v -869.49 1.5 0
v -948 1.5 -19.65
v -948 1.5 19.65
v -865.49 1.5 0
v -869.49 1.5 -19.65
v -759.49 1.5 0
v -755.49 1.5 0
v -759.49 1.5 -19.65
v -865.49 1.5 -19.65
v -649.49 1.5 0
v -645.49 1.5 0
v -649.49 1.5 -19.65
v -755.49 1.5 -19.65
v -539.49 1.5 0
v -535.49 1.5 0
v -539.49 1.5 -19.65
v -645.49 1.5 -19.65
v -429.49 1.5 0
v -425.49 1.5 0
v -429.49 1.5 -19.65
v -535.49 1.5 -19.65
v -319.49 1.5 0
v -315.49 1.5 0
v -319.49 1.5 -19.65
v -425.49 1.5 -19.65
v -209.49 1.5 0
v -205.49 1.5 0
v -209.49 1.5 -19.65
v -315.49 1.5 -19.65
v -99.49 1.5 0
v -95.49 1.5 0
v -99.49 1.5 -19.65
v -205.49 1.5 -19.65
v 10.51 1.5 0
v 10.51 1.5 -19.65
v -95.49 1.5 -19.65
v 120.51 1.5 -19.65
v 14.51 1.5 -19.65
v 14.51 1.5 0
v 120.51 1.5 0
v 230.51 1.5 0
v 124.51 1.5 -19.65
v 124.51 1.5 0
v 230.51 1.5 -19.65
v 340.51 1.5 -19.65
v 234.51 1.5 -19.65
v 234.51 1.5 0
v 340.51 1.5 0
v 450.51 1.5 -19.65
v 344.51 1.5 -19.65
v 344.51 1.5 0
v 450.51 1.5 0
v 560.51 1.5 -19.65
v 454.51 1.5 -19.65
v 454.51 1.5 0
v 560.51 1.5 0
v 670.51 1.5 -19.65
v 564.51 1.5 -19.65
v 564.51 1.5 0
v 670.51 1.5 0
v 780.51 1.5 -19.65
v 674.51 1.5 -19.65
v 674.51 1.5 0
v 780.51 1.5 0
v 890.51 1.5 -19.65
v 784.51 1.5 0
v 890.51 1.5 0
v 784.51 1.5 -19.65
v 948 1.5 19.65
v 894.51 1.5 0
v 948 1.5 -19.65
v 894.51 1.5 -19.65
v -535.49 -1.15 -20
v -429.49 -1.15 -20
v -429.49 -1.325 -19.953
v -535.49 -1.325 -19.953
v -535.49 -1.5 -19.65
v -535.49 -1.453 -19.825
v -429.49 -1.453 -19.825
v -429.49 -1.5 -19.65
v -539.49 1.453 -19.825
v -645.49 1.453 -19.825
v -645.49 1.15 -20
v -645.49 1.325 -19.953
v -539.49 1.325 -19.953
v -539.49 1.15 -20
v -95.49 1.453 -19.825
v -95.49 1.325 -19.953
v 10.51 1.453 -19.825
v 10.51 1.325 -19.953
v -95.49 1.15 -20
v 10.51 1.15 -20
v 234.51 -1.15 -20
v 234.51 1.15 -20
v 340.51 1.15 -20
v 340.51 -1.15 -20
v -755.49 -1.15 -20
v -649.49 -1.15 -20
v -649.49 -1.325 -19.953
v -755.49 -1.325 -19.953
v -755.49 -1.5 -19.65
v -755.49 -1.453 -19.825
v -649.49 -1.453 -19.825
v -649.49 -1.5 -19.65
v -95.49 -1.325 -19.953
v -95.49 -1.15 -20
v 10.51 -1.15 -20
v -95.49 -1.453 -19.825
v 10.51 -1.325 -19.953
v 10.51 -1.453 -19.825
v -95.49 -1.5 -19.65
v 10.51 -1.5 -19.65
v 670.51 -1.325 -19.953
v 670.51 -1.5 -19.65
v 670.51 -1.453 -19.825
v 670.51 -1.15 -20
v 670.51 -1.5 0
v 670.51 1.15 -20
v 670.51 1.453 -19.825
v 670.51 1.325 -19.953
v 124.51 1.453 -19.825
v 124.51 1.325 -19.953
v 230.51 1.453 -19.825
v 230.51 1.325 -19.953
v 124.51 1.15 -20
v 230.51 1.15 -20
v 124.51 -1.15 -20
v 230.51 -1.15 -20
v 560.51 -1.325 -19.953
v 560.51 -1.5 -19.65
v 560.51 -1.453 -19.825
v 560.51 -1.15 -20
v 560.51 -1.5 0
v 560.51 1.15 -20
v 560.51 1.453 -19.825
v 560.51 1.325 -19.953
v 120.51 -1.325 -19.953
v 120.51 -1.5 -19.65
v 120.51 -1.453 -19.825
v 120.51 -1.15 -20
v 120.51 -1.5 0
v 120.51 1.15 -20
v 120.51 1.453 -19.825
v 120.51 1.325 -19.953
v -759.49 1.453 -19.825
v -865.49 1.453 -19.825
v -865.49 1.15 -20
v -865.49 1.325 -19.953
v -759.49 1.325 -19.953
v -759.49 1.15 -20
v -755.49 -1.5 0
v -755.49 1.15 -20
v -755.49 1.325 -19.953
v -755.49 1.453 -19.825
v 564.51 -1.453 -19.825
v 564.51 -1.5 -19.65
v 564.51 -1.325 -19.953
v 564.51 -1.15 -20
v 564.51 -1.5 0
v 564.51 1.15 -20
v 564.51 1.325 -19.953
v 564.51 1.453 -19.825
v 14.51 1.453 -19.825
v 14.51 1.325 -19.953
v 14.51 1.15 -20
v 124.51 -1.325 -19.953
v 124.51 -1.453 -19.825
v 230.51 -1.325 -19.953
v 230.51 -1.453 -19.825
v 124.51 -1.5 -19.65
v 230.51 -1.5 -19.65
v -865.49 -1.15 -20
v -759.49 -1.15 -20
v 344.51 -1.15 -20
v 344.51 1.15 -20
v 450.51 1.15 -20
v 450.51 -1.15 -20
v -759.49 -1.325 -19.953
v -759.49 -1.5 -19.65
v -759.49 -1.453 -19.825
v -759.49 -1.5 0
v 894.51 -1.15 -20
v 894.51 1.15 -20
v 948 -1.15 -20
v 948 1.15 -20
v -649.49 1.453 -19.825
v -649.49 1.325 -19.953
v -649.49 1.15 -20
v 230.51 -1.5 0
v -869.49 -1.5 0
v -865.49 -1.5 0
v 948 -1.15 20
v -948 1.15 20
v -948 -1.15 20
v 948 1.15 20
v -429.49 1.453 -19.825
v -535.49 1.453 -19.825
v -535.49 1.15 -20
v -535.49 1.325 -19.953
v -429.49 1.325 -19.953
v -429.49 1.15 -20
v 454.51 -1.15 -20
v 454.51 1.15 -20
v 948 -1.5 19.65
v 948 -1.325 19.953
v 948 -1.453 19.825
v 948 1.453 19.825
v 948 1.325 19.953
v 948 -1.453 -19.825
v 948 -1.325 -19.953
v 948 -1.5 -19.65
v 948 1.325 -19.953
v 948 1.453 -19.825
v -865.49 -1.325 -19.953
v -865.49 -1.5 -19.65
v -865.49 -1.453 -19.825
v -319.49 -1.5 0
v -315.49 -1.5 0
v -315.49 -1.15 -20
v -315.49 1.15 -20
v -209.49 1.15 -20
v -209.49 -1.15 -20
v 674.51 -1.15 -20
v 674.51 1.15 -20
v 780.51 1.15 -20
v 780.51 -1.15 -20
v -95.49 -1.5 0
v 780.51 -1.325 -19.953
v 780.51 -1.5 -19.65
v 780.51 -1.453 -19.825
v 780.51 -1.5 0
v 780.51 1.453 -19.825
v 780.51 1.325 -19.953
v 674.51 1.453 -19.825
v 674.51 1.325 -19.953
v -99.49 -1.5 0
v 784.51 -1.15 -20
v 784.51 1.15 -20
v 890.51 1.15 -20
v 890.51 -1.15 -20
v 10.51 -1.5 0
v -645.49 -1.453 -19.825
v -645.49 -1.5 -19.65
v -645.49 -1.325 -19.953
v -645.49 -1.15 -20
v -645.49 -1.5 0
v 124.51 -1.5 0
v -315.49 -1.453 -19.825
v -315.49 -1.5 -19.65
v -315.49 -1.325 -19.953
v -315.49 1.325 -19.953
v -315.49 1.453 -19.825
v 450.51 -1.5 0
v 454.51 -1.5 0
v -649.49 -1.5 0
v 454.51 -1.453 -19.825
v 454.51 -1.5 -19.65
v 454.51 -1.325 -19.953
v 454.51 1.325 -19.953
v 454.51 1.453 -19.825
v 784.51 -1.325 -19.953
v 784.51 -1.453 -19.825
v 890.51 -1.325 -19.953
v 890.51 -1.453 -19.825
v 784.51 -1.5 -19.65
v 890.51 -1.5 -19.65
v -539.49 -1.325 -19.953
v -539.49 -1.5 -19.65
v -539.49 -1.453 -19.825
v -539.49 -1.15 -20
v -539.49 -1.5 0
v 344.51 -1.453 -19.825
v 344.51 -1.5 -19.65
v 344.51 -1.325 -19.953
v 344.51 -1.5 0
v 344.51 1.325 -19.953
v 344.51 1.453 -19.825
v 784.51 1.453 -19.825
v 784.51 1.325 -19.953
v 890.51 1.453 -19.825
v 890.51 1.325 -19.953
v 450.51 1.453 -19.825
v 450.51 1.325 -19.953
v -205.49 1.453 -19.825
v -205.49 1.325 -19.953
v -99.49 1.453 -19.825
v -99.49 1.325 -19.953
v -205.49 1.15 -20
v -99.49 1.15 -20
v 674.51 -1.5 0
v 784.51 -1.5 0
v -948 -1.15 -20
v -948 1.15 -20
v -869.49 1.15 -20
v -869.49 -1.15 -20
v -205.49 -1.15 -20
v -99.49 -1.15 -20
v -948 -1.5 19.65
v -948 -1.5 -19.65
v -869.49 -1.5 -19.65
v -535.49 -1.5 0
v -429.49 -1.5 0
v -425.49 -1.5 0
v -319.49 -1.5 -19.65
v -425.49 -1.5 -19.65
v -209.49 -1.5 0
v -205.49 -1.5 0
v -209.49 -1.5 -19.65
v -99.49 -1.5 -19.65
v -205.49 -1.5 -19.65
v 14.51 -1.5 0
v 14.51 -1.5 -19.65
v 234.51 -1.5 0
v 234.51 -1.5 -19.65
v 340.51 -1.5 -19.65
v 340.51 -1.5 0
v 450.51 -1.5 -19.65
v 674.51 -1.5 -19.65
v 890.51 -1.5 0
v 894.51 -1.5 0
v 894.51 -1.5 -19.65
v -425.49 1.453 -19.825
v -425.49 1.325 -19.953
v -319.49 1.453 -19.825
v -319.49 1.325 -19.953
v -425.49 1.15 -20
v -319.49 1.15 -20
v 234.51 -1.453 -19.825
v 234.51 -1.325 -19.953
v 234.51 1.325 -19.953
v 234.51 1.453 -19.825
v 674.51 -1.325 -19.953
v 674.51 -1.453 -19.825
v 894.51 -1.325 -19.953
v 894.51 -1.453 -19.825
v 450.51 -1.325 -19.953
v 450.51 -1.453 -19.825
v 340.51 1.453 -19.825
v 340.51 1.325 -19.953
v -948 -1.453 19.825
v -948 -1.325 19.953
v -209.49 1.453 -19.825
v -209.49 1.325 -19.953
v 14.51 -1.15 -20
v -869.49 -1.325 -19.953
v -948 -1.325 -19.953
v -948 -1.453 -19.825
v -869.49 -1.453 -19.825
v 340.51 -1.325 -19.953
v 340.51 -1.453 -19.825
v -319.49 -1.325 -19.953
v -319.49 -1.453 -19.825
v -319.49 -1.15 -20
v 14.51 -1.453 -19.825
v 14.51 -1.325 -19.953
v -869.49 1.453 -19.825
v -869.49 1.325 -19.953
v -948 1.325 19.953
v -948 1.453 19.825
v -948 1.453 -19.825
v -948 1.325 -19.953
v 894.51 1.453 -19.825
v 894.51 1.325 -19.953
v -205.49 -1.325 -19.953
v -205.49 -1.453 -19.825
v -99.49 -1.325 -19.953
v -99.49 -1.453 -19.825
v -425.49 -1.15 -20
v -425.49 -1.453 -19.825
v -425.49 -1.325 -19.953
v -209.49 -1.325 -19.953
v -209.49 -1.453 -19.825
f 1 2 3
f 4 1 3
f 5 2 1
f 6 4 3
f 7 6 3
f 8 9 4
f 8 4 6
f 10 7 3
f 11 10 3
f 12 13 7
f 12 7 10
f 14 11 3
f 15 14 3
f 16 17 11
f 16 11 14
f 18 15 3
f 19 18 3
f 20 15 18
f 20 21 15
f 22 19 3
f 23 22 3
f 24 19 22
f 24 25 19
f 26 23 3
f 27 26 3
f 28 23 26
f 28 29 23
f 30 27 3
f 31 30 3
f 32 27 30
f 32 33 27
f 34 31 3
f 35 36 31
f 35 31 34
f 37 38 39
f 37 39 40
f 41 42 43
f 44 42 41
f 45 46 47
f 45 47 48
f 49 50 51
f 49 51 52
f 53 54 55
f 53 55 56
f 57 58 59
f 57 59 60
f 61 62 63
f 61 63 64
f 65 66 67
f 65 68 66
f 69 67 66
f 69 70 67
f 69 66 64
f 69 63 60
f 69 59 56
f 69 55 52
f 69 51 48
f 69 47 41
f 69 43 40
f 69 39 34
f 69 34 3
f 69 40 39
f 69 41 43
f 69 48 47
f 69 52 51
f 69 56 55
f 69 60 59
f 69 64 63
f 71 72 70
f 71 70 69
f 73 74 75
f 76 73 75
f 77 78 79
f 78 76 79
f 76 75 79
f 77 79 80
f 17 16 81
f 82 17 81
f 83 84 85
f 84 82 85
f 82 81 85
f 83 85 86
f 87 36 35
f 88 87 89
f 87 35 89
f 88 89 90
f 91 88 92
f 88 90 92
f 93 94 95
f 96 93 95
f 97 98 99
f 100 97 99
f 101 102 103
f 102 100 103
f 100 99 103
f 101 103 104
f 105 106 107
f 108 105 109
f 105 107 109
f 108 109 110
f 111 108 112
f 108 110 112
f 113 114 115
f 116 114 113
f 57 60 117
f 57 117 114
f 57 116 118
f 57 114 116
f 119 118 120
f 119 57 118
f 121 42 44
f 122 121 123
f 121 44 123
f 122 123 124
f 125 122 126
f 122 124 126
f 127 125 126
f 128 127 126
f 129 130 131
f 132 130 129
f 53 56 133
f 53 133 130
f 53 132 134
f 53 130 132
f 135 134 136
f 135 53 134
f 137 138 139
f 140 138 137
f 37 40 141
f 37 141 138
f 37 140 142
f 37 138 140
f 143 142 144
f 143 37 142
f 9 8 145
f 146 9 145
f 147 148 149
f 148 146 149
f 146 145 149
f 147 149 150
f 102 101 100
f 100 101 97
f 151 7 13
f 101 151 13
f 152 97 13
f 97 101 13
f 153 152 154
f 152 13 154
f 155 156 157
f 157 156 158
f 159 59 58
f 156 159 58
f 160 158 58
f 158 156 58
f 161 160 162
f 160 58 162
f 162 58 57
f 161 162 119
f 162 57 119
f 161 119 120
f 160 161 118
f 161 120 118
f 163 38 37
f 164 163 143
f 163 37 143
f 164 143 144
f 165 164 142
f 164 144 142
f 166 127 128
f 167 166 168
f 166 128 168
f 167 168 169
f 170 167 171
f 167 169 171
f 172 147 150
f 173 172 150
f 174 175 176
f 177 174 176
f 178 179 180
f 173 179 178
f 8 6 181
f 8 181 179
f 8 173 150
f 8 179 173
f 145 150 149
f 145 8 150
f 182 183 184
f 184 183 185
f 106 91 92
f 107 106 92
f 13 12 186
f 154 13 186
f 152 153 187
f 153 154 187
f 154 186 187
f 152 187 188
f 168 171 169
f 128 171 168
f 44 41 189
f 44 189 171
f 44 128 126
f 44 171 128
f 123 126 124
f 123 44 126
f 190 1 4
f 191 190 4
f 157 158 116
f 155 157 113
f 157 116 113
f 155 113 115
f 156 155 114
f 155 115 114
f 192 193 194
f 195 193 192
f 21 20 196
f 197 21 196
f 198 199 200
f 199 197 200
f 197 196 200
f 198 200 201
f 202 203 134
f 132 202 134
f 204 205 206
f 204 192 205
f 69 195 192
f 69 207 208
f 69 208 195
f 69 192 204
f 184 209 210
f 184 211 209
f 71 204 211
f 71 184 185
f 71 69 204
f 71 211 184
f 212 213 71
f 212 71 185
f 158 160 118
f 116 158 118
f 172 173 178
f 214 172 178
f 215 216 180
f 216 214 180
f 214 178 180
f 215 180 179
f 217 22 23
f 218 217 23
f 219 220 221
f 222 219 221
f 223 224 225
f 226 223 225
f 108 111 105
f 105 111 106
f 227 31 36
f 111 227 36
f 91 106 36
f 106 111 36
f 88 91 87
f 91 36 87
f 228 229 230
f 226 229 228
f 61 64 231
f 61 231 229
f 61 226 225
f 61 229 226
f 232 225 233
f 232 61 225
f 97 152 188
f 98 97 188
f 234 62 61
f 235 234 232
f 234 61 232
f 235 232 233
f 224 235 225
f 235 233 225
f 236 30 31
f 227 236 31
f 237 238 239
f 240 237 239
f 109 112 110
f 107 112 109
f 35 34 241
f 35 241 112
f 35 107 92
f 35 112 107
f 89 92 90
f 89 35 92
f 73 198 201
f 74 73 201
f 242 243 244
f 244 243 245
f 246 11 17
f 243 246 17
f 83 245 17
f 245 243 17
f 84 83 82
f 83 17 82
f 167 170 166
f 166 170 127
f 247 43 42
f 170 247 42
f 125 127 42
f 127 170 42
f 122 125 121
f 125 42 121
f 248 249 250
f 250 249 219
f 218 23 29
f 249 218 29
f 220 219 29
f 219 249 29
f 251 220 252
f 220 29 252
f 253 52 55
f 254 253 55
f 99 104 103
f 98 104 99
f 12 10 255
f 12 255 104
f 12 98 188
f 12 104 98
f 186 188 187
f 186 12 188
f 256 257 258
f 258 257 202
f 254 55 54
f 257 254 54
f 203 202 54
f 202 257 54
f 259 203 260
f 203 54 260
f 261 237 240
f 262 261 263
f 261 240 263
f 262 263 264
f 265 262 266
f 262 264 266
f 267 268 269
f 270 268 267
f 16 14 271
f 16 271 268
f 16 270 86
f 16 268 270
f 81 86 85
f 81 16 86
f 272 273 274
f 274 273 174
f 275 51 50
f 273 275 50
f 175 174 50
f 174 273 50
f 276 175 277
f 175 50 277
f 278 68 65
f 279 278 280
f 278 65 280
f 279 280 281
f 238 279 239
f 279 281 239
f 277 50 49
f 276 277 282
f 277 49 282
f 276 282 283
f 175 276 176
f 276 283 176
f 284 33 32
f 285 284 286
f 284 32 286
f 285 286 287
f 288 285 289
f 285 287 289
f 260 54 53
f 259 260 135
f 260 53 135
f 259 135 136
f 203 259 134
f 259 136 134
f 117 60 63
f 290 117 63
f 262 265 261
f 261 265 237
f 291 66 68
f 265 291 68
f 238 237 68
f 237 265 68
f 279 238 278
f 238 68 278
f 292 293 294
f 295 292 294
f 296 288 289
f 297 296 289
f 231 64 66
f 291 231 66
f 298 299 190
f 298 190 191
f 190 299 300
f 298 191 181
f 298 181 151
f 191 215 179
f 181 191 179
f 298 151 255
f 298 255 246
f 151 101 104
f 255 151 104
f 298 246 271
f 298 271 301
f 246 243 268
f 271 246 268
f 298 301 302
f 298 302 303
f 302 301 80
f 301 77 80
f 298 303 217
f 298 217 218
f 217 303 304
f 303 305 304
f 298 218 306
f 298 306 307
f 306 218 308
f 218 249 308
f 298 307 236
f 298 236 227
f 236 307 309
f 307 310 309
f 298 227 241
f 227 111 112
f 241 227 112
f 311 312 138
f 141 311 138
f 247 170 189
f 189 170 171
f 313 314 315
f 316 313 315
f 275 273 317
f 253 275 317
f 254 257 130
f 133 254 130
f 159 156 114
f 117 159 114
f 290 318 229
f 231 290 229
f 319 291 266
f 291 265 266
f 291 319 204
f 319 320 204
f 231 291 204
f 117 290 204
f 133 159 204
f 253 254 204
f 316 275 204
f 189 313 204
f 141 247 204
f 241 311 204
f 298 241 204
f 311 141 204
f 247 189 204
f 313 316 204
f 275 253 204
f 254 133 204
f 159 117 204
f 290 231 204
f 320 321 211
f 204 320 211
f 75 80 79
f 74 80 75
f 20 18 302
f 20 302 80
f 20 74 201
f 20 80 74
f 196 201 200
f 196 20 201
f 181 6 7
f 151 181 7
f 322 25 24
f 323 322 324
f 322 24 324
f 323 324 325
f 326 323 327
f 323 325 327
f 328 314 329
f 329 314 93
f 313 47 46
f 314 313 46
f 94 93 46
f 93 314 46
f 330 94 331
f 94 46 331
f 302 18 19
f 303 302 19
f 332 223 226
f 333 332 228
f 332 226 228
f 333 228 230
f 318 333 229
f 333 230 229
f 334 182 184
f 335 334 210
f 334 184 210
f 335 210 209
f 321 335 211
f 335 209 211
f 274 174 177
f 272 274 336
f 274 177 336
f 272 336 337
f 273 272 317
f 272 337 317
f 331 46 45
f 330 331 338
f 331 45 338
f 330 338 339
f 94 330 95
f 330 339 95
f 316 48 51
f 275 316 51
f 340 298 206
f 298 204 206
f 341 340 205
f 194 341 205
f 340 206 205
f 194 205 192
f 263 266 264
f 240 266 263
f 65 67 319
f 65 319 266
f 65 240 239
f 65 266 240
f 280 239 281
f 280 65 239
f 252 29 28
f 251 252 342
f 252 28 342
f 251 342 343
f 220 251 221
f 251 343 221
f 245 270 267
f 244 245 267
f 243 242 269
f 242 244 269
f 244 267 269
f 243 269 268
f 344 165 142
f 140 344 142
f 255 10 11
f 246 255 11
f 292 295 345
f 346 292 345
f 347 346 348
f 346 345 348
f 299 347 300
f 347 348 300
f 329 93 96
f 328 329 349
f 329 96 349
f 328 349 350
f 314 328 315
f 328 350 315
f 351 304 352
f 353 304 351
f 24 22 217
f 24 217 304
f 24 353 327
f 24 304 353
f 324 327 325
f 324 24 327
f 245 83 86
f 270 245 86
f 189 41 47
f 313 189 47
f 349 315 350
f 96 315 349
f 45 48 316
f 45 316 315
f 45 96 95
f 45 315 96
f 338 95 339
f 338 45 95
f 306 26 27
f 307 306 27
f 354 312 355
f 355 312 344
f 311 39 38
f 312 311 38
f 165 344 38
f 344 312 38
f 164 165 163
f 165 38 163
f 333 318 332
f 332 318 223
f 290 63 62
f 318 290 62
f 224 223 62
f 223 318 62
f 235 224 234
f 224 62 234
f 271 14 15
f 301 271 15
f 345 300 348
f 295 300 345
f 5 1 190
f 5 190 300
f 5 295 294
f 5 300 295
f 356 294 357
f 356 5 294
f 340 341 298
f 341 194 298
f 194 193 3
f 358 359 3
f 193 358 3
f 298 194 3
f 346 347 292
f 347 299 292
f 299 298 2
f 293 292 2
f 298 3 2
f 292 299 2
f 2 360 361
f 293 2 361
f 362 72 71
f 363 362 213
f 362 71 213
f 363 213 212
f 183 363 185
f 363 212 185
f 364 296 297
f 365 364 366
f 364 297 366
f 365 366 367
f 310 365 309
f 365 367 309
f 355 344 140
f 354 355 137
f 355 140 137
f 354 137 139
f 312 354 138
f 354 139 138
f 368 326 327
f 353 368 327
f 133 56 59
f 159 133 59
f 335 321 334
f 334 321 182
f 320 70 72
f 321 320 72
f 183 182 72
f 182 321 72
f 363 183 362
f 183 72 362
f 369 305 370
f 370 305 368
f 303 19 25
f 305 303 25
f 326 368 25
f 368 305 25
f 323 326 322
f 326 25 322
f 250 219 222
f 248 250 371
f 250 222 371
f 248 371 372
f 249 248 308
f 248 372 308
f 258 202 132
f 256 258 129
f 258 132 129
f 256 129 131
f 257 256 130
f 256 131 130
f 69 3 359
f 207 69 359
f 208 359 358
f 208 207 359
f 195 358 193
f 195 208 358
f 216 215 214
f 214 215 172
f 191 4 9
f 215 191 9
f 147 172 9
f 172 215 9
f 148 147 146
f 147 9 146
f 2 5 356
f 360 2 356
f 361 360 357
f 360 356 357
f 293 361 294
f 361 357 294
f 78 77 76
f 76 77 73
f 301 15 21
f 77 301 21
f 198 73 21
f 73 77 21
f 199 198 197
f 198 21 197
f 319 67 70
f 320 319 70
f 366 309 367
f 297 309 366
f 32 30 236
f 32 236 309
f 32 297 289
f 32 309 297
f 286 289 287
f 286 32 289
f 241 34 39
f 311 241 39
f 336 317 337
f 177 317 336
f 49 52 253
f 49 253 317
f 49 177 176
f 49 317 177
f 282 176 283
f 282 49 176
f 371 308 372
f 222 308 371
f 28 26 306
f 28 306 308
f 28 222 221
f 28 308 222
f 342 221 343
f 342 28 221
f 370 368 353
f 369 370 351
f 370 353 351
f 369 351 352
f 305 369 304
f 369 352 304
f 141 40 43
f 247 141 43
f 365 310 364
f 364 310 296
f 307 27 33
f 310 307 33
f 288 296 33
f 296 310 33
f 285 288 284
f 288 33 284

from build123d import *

# Parameters (mm, degrees)
SKETCH1_W                = 1896
SKETCH1_H                = 40
BOSS_EXTRUDE1_DEPTH      = 1.5
BOSS_EXTRUDE1_DEPTH_BACK = 1.5
FILLET1_R                = 0.35
SKETCH2_W                = 4
SKETCH2_H                = 20
CUT_EXTRUDE1_DEPTH       = 4


with BuildPart() as part:
    # Sketch1 → Boss-Extrude1 (new body, two sides)
    with BuildSketch(Plane(origin=(0, 0, 0), x_dir=(1, 0, 0), z_dir=(0, 1, 0))) as boss_extrude1_sk:
        Rectangle(SKETCH1_W, SKETCH1_H)
    extrude(amount=BOSS_EXTRUDE1_DEPTH)
    extrude(boss_extrude1_sk.sketch, amount=-BOSS_EXTRUDE1_DEPTH_BACK)

    # Fillet1
    fillet1_edges = [part.edges().sort_by_distance(p)[0] for p in [
        (0, 1.5, -20),
        (0, 1.5, 20),
        (0, -1.5, 20),
        (0, -1.5, -20),
    ]]
    fillet(fillet1_edges, radius=FILLET1_R)

    # Sketch2 → Cut-Extrude1 (cut, through all)
    with BuildSketch(Plane(origin=(0, 1.5, 0), x_dir=(1, 0, 0), z_dir=(0, 1, 0))):
        with Locations((782.51, 10)):
            Rectangle(SKETCH2_W, SKETCH2_H)
        with Locations((892.51, 10)):
            Rectangle(SKETCH2_W, SKETCH2_H)
        with Locations((672.51, 10)):
            Rectangle(SKETCH2_W, SKETCH2_H)
        with Locations((562.51, 10)):
            Rectangle(SKETCH2_W, SKETCH2_H)
        with Locations((452.51, 10)):
            Rectangle(SKETCH2_W, SKETCH2_H)
        with Locations((342.51, 10)):
            Rectangle(SKETCH2_W, SKETCH2_H)
        with Locations((232.51, 10)):
            Rectangle(SKETCH2_W, SKETCH2_H)
        with Locations((122.51, 10)):
            Rectangle(SKETCH2_W, SKETCH2_H)
        with Locations((12.51, 10)):
            Rectangle(SKETCH2_W, SKETCH2_H)
        with Locations((-97.49, 10)):
            Rectangle(SKETCH2_W, SKETCH2_H)
        with Locations((-207.49, 10)):
            Rectangle(SKETCH2_W, SKETCH2_H)
        with Locations((-317.49, 10)):
            Rectangle(SKETCH2_W, SKETCH2_H)
        with Locations((-427.49, 10)):
            Rectangle(SKETCH2_W, SKETCH2_H)
        with Locations((-537.49, 10)):
            Rectangle(SKETCH2_W, SKETCH2_H)
        with Locations((-647.49, 10)):
            Rectangle(SKETCH2_W, SKETCH2_H)
        with Locations((-757.49, 10)):
            Rectangle(SKETCH2_W, SKETCH2_H)
        with Locations((-867.49, 10)):
            Rectangle(SKETCH2_W, SKETCH2_H)
    extrude(amount=-CUT_EXTRUDE1_DEPTH, mode=Mode.SUBTRACT)


solid = part.part
